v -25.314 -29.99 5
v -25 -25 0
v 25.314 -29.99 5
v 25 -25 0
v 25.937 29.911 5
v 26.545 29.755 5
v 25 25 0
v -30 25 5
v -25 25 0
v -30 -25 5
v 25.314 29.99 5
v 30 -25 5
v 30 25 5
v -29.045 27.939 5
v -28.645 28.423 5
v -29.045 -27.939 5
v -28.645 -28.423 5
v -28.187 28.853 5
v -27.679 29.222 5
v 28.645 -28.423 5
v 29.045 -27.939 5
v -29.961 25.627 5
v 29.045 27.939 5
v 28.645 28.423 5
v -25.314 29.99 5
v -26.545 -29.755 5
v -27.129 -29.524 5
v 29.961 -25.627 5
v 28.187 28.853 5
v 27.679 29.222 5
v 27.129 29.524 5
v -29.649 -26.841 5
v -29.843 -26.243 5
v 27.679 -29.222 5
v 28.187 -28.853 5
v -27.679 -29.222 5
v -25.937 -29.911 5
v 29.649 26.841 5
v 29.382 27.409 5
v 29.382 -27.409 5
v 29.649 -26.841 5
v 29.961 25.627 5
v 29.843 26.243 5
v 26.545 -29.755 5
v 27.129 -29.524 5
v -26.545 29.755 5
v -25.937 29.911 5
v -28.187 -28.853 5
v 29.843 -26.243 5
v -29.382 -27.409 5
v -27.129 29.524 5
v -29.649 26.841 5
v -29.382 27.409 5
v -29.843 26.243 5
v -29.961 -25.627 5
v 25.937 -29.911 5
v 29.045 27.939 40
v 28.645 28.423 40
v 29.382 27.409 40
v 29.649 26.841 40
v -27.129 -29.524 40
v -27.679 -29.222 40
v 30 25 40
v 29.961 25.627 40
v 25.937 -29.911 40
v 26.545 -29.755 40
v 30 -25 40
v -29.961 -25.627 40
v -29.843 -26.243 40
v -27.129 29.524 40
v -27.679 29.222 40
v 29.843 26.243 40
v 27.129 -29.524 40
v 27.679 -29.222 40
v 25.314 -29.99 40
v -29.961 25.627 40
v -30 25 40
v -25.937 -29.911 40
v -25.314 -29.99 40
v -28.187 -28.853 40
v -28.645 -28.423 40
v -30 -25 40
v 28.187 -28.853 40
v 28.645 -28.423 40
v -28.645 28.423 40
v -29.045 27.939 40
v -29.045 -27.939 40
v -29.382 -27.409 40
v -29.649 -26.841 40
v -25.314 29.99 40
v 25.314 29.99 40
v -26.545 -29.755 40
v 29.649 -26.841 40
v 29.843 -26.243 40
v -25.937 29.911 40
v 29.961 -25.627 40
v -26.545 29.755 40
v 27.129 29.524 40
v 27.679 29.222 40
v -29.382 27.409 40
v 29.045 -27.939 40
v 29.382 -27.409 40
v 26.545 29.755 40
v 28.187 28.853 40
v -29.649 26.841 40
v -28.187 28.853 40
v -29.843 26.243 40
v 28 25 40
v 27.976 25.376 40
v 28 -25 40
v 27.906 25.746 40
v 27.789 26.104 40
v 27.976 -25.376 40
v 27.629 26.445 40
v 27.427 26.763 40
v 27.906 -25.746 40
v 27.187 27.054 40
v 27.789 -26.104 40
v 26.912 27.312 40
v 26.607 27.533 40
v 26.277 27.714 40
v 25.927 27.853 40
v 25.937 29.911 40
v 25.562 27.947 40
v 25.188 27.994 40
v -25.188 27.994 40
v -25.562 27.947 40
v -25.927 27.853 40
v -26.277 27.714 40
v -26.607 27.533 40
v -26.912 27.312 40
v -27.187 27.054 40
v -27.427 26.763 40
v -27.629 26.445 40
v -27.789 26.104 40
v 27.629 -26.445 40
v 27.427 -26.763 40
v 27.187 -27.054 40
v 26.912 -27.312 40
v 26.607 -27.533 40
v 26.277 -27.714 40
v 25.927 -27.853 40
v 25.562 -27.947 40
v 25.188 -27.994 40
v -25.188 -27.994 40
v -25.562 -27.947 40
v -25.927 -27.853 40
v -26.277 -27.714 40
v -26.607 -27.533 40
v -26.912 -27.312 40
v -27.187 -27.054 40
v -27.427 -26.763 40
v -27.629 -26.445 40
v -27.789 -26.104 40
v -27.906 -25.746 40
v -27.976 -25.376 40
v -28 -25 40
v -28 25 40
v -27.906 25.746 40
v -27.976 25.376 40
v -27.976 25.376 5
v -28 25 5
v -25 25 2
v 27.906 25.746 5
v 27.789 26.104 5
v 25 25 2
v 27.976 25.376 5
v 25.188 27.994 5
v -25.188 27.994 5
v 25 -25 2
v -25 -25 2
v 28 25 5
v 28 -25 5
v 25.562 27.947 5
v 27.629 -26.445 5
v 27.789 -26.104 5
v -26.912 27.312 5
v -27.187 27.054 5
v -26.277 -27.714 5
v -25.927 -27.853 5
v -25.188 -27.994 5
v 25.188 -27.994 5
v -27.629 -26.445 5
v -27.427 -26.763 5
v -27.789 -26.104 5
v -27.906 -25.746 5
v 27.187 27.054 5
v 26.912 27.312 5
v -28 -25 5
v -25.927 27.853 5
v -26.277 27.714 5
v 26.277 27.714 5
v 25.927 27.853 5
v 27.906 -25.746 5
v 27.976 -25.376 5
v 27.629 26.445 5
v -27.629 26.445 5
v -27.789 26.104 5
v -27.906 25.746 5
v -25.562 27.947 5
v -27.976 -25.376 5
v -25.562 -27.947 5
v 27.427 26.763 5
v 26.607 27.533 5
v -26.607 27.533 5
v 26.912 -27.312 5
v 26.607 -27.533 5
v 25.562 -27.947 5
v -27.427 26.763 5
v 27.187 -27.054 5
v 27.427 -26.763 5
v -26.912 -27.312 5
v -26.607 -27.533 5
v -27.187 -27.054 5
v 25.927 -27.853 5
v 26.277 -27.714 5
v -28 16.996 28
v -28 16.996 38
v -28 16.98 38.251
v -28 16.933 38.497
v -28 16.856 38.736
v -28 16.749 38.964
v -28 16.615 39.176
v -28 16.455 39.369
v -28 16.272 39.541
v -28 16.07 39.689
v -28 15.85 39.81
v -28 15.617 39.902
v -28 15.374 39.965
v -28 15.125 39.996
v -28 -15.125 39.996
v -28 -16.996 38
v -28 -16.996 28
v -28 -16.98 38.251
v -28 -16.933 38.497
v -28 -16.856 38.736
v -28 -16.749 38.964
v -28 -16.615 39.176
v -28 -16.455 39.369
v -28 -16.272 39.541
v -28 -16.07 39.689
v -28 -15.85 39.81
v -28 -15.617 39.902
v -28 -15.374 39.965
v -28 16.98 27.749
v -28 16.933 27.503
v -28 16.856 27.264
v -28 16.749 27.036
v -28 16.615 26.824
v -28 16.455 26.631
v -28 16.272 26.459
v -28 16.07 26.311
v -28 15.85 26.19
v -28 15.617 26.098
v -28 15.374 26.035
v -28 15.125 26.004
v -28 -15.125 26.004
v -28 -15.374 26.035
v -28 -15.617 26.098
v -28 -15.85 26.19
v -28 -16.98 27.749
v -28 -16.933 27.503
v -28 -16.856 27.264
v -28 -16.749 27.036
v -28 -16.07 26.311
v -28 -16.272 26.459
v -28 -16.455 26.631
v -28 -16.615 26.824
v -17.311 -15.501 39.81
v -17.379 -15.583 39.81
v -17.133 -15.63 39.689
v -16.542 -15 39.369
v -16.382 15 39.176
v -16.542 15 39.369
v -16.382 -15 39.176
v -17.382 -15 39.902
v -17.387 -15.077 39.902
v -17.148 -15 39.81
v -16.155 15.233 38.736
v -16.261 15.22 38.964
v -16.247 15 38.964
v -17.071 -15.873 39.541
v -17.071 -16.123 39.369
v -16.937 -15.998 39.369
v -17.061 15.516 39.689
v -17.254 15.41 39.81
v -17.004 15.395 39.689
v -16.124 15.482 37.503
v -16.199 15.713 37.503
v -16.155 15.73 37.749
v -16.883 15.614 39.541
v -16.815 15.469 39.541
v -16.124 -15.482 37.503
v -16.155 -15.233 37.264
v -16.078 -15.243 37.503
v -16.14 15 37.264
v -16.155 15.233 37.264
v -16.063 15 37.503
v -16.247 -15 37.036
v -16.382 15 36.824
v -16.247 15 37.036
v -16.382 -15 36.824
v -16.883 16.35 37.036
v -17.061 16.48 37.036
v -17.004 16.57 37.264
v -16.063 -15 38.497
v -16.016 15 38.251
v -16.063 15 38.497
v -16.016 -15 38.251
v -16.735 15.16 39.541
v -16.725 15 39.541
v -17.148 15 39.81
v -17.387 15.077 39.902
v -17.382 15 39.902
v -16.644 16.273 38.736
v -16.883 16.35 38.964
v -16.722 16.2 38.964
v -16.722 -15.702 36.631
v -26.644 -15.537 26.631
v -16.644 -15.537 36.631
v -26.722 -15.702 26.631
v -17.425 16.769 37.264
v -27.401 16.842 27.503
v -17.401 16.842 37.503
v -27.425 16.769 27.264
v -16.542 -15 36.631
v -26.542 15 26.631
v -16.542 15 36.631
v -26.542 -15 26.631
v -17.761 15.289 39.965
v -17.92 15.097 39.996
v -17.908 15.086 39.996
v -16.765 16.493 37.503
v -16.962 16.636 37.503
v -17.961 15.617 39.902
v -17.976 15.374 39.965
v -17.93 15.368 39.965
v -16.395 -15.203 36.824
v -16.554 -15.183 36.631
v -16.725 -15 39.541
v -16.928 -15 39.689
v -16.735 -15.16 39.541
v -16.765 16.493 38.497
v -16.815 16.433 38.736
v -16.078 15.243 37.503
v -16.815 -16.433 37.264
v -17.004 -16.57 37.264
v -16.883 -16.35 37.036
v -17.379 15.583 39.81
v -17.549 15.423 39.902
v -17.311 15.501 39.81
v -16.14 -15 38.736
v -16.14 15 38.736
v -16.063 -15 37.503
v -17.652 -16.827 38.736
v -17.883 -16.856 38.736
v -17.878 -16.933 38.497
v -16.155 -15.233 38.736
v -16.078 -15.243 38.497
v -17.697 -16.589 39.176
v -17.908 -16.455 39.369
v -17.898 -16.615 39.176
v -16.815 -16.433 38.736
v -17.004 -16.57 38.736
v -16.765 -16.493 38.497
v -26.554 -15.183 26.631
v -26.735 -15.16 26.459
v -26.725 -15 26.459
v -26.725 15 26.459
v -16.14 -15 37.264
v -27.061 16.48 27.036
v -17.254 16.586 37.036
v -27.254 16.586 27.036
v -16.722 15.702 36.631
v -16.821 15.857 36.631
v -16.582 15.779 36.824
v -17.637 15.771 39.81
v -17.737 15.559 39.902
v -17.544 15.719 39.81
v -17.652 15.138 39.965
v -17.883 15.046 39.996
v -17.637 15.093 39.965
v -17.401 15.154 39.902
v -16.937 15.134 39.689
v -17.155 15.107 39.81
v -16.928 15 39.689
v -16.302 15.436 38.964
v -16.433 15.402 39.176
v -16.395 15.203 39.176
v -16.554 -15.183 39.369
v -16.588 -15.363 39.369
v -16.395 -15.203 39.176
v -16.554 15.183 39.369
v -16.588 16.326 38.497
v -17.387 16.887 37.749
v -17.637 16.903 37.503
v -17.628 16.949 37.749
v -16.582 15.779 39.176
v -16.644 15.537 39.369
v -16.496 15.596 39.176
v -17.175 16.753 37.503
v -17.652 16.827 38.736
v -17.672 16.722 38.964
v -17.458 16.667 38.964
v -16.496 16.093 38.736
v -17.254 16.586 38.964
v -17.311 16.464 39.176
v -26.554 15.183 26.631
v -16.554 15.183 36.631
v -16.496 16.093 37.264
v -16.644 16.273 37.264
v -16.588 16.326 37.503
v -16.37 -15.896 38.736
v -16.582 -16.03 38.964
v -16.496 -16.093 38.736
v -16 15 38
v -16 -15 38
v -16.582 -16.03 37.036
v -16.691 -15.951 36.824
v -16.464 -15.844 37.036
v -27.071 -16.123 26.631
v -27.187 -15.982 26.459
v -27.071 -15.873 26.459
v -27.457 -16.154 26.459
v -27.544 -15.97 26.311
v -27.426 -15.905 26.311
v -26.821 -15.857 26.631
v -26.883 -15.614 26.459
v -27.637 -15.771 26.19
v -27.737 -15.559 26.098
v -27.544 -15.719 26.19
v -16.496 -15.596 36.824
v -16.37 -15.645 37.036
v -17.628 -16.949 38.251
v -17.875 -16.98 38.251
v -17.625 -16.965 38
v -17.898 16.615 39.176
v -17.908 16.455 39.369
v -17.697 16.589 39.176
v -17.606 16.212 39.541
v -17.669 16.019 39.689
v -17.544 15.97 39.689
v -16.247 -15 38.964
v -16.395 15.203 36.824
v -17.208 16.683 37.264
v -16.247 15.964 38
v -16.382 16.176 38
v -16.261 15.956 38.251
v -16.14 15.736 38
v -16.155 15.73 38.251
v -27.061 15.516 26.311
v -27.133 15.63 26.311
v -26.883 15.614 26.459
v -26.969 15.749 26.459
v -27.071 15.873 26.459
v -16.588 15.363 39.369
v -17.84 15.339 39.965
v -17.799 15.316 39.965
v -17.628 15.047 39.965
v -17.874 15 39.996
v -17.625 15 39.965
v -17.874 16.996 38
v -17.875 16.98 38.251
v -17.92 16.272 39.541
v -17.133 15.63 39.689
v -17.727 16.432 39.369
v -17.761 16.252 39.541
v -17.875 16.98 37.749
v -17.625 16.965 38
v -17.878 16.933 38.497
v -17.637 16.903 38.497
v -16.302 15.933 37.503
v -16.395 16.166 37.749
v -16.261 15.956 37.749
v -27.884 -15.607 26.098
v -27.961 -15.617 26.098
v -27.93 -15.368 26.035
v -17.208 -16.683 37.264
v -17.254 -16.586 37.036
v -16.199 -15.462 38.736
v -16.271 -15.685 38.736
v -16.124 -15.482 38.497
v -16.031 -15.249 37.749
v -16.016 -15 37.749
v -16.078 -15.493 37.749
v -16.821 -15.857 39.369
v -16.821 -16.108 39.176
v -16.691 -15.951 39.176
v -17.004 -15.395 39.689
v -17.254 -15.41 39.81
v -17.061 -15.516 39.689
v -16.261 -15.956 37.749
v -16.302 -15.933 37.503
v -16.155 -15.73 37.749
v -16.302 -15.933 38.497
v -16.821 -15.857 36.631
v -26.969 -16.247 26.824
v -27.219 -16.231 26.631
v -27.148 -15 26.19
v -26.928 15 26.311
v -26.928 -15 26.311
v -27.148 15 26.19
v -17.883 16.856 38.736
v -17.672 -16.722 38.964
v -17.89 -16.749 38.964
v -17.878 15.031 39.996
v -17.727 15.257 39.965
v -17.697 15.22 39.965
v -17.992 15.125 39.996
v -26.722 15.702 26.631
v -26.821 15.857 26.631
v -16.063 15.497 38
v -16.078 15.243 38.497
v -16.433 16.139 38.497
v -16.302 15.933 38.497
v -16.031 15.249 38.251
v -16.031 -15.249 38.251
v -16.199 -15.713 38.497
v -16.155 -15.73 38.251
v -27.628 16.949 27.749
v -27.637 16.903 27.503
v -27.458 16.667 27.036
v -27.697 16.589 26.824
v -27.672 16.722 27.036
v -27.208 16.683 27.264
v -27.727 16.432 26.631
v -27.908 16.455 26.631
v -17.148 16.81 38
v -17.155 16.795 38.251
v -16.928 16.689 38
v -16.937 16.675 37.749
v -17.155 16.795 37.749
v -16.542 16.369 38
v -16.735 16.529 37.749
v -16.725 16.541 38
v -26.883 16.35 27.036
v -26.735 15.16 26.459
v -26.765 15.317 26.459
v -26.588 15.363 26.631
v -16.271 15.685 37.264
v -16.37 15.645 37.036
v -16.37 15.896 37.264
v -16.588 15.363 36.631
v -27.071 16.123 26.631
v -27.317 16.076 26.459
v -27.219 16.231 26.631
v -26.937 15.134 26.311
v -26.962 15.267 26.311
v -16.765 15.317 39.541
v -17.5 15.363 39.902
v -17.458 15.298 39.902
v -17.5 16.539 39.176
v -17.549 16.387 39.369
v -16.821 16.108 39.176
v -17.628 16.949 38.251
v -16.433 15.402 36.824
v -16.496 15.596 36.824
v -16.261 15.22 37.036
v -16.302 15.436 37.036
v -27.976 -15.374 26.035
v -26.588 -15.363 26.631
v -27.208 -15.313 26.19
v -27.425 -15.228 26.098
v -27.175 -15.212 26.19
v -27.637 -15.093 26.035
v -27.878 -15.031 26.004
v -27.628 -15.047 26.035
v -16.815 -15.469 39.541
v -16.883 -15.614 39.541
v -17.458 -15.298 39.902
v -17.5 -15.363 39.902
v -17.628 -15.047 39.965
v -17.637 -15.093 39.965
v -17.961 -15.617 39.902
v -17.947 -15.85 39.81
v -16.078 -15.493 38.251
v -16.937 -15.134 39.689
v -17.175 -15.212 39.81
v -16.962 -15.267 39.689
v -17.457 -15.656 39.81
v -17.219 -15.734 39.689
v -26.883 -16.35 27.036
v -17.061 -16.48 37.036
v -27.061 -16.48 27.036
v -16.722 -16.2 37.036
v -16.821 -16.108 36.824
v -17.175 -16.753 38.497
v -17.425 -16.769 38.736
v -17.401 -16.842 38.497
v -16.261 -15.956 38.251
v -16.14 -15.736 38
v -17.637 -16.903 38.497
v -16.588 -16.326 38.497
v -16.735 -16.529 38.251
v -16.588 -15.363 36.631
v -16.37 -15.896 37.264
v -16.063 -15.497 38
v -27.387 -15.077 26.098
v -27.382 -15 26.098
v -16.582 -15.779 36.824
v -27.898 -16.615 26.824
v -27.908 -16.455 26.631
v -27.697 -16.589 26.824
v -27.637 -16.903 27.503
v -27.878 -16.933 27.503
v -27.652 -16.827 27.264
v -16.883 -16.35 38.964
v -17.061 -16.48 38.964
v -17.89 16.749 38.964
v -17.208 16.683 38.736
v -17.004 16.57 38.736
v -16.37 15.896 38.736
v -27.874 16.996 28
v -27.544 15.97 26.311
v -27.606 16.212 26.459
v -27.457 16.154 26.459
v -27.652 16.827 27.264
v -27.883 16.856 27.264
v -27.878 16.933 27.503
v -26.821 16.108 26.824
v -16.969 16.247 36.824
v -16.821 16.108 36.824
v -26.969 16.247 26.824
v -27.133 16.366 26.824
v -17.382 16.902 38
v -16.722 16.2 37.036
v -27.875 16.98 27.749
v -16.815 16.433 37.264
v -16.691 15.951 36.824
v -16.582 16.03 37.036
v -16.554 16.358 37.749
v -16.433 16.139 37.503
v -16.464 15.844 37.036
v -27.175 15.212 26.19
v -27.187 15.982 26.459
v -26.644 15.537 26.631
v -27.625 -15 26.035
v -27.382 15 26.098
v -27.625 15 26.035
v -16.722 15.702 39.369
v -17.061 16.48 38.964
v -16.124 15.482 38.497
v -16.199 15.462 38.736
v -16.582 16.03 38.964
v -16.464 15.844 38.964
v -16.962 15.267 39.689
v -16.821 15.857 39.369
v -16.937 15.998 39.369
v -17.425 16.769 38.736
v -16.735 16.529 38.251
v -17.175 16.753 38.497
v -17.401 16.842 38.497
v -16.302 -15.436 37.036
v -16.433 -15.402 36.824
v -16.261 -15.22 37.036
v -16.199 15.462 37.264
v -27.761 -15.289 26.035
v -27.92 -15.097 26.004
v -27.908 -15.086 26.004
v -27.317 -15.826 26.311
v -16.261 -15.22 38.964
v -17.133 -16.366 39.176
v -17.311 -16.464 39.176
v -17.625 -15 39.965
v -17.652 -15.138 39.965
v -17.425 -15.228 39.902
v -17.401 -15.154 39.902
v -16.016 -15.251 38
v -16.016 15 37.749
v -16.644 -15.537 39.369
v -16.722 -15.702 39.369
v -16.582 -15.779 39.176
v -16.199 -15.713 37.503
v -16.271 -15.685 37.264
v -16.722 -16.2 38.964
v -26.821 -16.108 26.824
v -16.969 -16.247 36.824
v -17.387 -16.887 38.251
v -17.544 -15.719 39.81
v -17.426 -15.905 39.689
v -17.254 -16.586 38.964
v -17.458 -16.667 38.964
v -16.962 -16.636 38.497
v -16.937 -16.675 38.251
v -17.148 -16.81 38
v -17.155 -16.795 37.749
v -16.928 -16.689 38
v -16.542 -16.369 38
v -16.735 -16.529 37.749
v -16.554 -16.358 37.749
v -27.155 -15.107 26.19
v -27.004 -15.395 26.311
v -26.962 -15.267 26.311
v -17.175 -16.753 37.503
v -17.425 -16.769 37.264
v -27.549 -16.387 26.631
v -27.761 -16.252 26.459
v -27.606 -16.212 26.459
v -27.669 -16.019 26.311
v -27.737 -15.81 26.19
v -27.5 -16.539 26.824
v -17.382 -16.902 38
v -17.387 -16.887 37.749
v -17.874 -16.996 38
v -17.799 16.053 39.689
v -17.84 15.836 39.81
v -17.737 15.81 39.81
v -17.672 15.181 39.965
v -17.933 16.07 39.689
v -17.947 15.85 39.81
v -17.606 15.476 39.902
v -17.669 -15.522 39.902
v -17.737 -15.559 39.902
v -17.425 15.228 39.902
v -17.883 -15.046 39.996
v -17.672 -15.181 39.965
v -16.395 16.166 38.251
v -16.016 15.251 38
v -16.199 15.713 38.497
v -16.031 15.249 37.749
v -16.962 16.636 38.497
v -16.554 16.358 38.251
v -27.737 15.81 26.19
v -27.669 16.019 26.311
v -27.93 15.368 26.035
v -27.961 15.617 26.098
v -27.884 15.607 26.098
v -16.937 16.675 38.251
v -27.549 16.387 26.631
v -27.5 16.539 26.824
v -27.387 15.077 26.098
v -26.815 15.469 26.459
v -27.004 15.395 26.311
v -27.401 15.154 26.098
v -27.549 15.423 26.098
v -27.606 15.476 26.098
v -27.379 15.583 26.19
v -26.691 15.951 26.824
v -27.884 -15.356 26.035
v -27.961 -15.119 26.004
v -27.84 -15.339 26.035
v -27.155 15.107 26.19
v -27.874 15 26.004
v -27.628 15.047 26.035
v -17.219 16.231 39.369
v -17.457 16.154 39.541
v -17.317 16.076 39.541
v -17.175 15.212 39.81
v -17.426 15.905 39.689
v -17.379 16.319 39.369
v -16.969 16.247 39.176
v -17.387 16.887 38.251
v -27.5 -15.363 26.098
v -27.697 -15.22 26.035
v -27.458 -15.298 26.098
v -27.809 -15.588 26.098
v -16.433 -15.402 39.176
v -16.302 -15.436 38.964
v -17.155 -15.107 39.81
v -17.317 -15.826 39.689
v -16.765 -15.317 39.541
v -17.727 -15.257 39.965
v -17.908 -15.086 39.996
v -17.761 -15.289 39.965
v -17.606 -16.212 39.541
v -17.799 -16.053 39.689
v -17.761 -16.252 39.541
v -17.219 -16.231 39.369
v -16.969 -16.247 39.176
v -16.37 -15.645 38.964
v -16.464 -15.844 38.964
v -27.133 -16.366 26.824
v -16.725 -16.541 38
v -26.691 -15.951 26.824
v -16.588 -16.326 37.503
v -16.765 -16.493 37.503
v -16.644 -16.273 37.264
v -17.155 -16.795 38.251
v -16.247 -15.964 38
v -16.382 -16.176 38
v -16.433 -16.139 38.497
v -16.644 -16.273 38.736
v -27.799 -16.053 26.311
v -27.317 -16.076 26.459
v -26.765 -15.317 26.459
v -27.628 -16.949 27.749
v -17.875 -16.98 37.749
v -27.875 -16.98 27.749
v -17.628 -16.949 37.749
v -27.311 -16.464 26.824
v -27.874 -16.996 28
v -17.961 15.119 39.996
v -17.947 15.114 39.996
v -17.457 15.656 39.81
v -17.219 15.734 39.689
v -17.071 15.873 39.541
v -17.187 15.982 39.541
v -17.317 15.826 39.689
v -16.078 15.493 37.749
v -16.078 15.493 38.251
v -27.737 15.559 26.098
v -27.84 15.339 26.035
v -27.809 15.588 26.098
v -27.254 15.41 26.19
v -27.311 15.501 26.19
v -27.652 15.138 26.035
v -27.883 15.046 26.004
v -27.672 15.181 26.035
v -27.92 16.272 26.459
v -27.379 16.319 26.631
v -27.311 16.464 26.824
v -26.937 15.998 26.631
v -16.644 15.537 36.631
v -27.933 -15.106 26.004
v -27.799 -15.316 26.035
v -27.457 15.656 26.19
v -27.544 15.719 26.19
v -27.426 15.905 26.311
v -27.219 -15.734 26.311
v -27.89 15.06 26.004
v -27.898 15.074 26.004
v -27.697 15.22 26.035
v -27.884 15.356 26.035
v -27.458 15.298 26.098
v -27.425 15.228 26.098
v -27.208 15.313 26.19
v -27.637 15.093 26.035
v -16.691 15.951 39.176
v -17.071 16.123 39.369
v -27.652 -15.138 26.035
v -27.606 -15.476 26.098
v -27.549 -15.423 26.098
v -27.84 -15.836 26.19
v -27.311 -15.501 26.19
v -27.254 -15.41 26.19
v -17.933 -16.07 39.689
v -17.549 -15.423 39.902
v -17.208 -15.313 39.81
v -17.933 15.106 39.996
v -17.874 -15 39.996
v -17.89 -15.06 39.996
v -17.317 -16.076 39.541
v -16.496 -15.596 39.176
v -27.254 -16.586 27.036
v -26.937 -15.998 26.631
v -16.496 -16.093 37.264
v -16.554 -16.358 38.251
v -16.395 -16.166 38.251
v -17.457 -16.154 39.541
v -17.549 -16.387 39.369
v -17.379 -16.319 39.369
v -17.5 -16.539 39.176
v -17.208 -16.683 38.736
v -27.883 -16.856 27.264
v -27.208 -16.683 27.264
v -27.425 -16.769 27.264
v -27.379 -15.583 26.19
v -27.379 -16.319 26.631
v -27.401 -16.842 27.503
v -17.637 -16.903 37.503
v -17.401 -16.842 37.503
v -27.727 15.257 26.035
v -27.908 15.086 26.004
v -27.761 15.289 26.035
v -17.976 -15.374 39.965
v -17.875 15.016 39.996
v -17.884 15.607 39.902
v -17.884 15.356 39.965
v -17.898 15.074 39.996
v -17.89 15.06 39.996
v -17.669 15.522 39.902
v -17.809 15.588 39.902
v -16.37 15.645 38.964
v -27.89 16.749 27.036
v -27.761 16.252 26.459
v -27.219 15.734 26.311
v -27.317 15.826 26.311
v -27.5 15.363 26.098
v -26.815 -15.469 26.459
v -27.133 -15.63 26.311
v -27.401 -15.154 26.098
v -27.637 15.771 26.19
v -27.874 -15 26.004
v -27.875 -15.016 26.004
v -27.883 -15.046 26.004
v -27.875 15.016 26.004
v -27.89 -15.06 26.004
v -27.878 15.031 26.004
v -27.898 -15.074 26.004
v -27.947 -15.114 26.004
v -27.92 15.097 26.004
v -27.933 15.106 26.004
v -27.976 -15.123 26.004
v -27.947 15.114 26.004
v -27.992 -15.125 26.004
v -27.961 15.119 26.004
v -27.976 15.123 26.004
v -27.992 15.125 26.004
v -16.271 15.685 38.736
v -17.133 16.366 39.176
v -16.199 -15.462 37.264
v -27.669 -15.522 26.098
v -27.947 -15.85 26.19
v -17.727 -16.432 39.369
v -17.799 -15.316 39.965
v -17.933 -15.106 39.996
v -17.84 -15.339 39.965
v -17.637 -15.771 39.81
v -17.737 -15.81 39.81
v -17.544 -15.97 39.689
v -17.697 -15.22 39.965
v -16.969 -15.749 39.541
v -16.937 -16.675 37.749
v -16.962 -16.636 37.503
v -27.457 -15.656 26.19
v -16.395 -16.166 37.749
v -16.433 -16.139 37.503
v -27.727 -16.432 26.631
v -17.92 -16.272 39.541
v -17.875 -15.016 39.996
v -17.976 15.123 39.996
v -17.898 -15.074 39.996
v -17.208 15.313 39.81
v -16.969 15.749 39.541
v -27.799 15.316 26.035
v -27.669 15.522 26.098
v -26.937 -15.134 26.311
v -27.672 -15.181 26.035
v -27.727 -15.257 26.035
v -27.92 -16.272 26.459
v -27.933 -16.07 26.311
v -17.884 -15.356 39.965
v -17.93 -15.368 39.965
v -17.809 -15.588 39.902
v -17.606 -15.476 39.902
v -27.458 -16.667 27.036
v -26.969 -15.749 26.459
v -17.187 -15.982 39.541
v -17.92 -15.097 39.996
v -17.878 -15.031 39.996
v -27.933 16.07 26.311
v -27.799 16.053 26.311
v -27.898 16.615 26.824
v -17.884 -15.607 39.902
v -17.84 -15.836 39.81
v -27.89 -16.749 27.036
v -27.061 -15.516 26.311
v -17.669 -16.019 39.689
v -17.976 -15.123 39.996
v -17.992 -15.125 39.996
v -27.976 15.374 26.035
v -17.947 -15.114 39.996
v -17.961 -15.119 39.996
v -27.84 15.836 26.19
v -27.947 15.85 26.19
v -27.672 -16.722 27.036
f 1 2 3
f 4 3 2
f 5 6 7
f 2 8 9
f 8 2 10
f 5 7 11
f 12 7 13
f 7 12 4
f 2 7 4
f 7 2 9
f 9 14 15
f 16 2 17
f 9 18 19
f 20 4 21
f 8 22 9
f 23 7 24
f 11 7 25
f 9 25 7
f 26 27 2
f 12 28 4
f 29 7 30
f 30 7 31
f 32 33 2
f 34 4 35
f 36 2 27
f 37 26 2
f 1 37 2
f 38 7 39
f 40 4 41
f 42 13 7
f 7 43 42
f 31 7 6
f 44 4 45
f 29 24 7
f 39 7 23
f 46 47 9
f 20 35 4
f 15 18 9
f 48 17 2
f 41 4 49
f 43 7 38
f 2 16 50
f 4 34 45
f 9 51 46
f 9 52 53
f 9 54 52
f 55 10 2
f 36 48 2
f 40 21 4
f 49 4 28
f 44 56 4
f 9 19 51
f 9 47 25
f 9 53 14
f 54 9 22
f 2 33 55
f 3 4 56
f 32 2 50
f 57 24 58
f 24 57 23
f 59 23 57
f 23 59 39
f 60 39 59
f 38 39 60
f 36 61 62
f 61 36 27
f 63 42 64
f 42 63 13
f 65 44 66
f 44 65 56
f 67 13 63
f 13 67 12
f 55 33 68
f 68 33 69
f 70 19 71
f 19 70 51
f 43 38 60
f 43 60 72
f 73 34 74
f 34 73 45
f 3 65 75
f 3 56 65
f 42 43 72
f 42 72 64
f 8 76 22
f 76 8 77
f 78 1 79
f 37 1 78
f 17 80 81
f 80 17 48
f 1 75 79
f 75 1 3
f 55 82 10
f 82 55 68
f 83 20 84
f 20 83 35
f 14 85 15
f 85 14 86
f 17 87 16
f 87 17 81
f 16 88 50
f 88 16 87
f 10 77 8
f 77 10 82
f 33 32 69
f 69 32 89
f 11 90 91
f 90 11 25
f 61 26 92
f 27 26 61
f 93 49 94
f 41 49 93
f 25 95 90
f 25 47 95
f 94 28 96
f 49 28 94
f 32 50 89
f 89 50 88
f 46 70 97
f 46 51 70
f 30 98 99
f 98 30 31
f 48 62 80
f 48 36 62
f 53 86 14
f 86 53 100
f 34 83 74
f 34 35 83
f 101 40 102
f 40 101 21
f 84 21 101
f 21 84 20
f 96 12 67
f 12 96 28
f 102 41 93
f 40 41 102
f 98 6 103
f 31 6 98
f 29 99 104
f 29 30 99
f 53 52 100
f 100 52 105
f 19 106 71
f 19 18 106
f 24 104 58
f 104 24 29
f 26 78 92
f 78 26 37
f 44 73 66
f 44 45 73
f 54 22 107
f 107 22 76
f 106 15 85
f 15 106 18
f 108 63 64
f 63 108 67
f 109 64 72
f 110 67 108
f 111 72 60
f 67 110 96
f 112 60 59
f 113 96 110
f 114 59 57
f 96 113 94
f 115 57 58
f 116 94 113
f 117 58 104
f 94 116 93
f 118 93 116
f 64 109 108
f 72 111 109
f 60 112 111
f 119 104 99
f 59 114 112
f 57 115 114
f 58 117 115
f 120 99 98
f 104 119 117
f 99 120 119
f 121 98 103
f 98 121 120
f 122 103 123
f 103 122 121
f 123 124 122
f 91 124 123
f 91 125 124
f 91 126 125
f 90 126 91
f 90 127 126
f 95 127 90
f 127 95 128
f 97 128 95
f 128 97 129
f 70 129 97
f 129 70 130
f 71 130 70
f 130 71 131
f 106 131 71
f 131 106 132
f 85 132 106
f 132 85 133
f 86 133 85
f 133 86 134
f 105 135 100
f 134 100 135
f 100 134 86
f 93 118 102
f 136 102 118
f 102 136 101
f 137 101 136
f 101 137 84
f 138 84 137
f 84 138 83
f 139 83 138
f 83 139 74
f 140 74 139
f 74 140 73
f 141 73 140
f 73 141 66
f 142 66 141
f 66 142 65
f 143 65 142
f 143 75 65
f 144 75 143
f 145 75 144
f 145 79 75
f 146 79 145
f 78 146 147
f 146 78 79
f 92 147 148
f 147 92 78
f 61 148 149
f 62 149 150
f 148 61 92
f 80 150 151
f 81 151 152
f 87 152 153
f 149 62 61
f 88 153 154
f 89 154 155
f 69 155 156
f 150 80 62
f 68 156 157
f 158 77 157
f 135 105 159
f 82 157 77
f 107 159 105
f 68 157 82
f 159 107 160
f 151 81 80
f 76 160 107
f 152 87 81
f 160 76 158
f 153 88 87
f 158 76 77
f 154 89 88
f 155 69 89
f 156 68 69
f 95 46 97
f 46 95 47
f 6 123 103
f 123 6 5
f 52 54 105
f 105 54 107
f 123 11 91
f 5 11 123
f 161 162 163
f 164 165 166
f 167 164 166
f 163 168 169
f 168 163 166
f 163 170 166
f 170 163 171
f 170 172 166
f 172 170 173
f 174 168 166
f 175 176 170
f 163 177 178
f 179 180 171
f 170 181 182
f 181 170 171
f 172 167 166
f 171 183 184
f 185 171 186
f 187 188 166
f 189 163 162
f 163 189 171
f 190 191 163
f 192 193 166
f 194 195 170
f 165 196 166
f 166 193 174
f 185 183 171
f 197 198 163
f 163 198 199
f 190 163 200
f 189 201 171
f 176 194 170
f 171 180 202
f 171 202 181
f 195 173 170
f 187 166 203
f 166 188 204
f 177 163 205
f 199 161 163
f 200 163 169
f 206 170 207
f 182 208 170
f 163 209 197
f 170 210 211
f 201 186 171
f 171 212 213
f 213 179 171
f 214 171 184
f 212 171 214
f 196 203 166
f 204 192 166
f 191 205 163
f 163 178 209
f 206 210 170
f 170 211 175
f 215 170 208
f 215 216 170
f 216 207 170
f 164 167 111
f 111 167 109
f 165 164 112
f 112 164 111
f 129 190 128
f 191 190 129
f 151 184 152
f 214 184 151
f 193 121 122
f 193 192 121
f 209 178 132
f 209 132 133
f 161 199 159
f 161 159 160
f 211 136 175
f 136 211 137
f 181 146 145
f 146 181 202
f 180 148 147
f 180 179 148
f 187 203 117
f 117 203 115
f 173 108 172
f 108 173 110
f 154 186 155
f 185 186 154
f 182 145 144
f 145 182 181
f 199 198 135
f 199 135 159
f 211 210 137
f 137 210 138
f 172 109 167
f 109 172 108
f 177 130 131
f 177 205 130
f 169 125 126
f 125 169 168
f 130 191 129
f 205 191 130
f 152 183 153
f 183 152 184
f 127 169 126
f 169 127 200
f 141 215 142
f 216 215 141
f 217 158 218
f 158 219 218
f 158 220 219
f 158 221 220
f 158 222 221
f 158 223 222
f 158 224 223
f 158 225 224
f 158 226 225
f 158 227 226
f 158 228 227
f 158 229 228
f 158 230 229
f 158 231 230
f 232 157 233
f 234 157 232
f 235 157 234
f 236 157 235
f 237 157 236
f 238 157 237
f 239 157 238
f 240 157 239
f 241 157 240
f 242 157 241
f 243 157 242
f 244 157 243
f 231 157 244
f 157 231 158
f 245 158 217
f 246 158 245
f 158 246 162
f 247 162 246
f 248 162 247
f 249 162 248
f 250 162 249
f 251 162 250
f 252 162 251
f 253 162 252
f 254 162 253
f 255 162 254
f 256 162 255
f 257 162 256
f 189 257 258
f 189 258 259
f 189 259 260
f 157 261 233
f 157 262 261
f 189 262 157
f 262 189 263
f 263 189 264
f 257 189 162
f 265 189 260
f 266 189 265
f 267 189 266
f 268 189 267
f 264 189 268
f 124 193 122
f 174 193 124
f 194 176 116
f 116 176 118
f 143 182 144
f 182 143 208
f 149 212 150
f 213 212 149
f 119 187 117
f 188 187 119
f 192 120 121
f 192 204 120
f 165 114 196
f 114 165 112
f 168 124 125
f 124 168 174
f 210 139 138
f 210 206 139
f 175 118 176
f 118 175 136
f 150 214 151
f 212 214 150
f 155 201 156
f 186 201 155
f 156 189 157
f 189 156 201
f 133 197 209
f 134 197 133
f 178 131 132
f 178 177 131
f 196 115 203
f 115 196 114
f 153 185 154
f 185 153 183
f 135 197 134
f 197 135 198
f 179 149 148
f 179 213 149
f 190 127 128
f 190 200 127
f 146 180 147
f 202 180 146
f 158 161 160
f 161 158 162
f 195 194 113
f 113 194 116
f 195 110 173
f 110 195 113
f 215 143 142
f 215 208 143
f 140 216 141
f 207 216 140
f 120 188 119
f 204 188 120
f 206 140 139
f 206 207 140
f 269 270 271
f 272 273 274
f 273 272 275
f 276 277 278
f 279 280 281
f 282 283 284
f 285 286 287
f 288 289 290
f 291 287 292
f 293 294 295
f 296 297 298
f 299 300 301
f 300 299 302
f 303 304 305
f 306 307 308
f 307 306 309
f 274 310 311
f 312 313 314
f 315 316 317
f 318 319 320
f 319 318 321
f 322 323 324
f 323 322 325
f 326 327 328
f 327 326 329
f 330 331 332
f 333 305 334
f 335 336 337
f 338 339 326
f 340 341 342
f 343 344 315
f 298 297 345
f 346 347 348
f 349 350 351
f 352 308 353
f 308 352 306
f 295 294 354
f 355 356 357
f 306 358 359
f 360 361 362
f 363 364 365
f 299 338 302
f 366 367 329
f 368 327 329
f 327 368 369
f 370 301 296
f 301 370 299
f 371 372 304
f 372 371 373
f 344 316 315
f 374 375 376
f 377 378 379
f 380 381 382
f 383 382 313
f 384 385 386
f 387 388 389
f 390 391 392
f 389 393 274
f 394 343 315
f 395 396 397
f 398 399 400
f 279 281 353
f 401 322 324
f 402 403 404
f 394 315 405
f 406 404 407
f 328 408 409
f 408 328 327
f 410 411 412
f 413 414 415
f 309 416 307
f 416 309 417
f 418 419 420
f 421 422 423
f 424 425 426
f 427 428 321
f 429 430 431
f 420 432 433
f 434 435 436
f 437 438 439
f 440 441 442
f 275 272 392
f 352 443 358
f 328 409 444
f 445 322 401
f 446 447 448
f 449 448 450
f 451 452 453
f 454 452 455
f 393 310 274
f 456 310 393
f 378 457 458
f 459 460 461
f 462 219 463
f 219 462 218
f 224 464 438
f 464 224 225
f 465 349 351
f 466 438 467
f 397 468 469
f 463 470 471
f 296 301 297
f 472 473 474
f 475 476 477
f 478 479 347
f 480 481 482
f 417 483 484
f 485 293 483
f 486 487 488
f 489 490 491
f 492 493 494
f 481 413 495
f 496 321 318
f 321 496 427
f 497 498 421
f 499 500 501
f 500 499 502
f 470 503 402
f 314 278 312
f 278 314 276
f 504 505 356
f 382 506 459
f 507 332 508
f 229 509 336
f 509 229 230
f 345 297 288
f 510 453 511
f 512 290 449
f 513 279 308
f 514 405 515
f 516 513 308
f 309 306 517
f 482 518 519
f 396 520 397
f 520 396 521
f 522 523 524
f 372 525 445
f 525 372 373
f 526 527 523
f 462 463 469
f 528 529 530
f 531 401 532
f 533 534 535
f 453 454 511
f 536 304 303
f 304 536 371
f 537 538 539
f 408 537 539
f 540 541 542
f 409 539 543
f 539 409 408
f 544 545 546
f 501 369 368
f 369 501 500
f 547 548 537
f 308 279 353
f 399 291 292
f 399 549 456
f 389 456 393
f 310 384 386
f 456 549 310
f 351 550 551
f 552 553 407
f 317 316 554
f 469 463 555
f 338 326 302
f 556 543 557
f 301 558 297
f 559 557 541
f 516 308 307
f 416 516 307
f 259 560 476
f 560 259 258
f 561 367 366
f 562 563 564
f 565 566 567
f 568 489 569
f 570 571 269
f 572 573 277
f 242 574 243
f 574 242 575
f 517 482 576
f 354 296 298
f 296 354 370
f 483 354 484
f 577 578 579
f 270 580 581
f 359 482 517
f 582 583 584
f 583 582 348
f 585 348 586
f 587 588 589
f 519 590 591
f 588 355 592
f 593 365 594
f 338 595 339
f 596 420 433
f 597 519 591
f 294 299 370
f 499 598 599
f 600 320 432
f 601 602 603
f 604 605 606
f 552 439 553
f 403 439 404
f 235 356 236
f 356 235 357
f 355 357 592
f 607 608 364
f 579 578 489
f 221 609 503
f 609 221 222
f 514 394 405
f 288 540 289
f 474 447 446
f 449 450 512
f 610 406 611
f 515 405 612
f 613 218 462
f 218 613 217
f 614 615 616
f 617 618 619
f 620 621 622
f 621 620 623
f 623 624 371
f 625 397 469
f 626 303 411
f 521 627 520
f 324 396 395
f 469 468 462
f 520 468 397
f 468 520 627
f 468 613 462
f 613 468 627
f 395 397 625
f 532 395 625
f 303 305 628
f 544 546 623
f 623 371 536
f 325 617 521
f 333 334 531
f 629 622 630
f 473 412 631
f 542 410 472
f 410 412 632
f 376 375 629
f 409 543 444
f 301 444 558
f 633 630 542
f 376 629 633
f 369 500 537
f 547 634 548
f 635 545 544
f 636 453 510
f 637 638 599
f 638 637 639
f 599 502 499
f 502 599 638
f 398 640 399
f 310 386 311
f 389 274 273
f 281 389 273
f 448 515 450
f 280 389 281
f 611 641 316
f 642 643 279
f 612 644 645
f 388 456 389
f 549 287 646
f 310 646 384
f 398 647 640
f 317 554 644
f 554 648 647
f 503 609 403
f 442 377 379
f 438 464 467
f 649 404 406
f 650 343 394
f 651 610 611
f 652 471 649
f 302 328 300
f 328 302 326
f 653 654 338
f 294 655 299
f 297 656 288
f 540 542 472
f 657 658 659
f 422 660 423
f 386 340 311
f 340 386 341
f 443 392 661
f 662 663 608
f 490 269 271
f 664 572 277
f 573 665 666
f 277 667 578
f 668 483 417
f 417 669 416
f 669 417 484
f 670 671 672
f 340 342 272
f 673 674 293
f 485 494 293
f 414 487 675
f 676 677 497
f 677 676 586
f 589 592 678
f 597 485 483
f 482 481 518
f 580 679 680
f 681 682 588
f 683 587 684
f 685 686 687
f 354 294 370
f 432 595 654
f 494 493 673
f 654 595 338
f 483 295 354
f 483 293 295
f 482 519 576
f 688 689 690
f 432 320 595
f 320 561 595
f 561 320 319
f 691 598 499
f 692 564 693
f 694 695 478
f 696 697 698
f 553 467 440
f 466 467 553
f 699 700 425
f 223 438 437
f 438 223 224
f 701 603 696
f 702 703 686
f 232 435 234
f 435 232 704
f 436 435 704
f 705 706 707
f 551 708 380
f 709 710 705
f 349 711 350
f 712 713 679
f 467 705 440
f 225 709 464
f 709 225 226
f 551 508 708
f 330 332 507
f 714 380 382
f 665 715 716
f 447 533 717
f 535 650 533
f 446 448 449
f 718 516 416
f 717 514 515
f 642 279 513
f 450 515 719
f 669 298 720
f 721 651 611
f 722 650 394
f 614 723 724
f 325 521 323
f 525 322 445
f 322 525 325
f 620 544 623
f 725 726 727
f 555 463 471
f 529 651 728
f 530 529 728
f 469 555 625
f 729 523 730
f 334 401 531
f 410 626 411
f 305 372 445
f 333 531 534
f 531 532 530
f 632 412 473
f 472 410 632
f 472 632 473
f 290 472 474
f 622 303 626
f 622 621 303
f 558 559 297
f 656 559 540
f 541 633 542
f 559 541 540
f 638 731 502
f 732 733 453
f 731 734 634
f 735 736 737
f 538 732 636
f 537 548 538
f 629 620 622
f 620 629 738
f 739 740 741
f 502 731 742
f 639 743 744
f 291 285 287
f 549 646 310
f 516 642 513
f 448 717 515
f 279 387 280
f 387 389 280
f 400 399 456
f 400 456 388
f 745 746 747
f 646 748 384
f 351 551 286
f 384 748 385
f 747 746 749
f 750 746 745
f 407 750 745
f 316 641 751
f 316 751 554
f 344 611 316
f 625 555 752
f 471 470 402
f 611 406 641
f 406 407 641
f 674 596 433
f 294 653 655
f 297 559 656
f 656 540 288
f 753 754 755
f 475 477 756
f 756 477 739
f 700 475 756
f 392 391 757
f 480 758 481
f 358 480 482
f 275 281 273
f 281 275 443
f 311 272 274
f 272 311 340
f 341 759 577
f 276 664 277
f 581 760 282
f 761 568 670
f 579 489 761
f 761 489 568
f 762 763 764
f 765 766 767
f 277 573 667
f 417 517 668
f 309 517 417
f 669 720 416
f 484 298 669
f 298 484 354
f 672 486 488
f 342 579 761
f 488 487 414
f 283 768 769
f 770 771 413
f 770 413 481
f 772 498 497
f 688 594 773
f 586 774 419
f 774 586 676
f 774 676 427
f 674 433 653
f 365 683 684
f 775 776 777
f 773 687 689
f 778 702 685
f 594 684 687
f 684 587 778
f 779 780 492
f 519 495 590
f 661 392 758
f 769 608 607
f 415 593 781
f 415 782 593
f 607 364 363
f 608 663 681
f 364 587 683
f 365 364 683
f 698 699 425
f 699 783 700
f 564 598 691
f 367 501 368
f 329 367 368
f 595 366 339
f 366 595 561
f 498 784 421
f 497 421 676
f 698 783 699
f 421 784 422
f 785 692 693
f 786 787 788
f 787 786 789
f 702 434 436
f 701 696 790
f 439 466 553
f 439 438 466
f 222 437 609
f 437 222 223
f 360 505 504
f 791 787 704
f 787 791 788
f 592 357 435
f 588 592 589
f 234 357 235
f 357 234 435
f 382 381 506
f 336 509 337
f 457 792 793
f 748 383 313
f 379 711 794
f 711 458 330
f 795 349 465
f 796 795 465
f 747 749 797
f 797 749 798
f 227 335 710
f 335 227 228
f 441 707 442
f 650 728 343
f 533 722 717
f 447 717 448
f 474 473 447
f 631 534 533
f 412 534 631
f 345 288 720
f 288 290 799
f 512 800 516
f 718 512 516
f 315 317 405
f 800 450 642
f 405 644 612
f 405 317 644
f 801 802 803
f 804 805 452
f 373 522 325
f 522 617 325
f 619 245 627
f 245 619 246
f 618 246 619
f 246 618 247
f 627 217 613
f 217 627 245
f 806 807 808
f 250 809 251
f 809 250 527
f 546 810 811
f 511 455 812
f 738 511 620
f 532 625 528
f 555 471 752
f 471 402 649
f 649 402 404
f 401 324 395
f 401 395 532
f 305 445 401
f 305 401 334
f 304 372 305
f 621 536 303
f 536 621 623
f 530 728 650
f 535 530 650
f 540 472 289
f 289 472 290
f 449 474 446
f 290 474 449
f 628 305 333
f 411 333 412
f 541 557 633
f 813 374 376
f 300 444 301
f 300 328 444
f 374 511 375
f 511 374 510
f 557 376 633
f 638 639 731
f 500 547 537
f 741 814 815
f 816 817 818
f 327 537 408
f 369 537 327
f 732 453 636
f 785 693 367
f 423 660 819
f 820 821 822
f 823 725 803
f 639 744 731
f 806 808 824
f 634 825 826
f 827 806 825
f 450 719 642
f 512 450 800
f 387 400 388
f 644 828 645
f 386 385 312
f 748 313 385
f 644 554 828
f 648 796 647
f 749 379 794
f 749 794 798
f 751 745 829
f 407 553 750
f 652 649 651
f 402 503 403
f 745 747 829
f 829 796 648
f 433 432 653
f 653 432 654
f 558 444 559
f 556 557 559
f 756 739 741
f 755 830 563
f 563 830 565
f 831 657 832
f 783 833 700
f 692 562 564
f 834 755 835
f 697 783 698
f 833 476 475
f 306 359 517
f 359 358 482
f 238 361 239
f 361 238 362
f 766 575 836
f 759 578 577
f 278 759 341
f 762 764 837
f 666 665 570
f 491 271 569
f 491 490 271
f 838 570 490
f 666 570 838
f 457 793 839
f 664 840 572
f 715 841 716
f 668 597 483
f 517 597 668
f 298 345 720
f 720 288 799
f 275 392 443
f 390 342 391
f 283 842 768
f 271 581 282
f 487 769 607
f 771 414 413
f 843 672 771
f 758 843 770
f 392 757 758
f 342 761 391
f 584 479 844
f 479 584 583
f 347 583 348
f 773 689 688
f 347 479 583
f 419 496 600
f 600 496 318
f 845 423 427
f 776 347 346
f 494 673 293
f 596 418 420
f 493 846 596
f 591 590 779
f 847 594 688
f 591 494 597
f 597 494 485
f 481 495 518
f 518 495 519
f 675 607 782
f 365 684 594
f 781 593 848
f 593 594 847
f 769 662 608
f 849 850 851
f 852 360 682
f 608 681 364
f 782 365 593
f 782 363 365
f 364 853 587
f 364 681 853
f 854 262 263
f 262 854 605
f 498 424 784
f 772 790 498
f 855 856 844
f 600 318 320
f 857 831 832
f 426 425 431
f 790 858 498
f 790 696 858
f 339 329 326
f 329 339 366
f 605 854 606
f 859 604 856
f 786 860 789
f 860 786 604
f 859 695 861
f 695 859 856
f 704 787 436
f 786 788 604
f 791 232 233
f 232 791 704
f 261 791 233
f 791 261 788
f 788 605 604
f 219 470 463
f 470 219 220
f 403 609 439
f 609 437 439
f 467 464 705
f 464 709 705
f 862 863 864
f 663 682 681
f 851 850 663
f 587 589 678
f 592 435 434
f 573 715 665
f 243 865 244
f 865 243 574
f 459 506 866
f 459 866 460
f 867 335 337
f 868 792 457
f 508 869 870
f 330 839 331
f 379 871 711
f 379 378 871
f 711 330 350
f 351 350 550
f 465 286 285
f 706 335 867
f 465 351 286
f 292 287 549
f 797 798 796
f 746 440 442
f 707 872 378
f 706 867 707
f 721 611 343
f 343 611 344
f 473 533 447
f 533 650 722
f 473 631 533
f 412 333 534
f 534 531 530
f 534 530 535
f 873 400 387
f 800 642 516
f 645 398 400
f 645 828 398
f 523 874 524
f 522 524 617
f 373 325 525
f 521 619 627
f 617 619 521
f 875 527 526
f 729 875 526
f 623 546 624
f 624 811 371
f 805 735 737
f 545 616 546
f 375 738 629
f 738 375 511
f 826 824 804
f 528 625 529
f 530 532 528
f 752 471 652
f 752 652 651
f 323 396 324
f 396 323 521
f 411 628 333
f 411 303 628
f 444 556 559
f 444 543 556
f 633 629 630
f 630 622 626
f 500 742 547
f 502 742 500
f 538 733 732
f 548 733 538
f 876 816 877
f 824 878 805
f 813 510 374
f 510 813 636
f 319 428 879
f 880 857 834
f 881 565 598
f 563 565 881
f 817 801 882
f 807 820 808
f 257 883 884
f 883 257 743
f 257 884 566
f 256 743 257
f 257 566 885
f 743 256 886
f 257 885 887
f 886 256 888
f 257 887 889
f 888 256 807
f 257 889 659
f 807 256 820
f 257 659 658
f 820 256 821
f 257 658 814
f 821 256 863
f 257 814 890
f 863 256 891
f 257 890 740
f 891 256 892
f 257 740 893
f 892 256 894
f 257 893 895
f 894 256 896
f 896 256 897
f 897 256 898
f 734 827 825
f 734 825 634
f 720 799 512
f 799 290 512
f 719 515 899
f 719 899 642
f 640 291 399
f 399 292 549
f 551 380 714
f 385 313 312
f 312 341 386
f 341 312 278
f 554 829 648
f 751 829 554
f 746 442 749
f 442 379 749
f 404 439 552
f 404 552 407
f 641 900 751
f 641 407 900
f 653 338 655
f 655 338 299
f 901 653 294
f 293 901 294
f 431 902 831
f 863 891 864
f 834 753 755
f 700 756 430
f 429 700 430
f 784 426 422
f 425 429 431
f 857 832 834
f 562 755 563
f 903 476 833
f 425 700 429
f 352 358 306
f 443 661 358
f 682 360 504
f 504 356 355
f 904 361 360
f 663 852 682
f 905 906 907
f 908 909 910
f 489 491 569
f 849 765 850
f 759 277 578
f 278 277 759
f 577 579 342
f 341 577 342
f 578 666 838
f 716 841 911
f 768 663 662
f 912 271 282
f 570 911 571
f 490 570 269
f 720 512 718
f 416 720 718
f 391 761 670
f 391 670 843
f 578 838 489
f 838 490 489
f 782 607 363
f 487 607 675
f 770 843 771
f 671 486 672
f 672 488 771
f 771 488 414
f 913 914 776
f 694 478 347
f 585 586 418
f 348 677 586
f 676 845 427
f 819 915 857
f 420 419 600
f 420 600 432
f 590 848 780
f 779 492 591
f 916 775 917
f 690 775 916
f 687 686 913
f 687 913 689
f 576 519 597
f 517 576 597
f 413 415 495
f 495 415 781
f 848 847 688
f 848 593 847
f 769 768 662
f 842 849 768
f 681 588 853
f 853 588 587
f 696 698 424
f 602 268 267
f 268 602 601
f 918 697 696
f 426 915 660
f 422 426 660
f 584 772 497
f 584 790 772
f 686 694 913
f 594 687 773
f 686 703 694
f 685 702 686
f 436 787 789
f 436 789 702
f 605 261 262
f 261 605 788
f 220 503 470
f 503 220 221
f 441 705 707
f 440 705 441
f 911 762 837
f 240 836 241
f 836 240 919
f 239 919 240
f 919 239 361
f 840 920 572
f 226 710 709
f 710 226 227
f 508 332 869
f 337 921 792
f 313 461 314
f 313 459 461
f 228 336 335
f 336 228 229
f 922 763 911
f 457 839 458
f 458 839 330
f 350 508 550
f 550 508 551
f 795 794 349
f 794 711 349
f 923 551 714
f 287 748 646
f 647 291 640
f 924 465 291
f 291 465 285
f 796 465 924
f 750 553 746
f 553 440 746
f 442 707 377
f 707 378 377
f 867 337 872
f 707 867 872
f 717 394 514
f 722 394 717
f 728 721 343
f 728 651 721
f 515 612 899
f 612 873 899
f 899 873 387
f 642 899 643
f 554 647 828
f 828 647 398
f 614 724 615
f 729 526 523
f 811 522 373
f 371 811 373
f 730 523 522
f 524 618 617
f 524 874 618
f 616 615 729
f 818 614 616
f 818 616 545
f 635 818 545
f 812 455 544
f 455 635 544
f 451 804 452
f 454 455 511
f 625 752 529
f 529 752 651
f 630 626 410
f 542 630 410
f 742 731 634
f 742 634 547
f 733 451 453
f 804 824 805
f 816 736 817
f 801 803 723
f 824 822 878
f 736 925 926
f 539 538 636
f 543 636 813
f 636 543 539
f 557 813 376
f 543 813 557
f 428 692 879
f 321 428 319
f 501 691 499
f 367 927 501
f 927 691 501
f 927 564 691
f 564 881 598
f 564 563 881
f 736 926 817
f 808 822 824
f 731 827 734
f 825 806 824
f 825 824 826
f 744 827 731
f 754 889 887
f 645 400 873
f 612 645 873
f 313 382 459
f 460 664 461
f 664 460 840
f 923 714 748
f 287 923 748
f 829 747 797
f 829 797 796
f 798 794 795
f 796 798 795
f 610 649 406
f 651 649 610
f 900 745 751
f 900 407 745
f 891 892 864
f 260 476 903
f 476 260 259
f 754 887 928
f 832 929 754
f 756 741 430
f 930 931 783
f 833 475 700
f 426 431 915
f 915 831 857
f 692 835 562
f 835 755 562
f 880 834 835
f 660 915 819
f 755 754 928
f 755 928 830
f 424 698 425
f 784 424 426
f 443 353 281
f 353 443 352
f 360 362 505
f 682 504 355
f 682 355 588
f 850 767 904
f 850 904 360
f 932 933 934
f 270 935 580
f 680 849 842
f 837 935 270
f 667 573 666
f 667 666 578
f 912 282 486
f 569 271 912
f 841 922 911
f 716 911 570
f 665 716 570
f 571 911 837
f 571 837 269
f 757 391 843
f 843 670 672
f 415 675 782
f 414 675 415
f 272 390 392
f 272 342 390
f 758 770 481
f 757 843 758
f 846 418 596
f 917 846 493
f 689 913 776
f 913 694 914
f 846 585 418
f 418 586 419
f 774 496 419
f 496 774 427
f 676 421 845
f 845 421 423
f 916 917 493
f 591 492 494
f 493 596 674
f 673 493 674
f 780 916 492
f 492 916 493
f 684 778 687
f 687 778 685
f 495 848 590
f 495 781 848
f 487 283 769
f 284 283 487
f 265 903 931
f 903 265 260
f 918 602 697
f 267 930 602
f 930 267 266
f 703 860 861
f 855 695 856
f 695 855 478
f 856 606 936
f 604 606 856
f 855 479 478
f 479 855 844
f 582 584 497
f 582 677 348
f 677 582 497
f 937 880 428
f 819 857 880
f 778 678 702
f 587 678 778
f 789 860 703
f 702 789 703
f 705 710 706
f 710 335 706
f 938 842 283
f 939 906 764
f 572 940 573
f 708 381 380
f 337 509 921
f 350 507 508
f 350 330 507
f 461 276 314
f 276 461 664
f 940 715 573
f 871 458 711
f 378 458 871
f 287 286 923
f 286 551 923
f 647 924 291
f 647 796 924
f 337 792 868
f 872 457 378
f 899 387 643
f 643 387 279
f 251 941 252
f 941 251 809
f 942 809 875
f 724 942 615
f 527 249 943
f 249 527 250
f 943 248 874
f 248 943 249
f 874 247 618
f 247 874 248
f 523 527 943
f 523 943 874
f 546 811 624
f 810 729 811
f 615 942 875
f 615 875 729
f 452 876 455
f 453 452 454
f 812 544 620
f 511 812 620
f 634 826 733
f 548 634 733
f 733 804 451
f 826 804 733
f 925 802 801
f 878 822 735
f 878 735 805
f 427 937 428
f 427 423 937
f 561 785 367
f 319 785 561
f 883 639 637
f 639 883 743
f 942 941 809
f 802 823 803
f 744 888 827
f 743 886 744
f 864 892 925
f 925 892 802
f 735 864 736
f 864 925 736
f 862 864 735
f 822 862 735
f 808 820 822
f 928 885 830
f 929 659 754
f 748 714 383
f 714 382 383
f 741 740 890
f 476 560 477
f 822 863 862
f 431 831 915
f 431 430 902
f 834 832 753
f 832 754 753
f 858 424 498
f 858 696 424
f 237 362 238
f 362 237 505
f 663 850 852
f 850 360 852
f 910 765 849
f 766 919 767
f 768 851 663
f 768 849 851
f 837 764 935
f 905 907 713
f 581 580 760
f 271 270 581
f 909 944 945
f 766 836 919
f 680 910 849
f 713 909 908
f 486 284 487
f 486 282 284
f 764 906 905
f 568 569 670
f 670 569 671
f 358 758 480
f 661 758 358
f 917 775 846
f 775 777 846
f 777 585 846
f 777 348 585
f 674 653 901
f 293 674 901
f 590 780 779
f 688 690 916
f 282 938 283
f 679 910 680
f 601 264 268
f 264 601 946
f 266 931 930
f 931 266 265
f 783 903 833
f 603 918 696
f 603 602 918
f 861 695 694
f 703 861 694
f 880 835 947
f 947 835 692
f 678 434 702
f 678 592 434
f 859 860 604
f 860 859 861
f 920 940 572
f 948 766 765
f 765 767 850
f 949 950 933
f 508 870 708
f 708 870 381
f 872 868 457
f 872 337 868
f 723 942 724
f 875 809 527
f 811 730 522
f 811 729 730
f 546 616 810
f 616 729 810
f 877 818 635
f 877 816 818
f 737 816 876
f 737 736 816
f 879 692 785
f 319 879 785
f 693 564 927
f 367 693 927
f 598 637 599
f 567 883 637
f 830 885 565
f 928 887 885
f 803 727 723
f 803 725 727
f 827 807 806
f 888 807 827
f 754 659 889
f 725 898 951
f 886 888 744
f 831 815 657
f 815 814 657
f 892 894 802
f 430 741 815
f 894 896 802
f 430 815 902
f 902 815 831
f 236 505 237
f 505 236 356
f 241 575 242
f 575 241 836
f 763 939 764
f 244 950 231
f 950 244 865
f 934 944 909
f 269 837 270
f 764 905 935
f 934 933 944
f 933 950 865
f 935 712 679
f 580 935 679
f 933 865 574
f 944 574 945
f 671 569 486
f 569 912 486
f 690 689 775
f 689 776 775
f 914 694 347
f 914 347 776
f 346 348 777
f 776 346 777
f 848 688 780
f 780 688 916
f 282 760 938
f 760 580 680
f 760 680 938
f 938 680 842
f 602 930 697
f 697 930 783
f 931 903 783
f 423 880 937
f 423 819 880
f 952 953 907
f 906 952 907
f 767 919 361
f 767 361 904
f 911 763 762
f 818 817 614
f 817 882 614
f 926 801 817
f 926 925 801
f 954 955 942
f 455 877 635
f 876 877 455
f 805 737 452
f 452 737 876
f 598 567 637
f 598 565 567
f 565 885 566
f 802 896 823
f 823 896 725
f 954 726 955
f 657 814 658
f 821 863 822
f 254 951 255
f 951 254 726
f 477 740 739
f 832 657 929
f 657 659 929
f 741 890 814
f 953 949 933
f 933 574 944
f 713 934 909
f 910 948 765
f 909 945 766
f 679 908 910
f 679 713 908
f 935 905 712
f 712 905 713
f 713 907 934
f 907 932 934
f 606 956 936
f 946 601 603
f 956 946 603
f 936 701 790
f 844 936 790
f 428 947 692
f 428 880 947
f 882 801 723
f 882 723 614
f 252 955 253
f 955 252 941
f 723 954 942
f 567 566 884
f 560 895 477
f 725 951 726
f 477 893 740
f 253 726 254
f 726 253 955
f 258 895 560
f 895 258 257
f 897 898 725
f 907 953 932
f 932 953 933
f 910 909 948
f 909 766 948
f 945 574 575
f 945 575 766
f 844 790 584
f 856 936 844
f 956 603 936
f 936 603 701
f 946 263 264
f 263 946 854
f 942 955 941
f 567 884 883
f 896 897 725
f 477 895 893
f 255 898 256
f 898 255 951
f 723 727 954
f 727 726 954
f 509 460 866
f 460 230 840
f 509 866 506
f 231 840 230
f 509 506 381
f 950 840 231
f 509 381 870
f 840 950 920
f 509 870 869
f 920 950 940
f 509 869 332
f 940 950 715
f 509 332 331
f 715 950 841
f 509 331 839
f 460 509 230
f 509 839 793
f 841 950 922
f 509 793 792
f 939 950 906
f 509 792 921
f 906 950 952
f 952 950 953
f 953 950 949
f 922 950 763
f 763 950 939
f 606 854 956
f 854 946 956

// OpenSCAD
$fn=50;

box_height=40;
box_size=60;
radius=5;
wall=2;
label_size=10;
label_length=30;

difference() {
    box(box_height, box_size, radius);
    
    translate([0, 0, wall]) {
        box(box_height, box_size-2*wall, radius-wall);
    }
}

translate([(-box_size)/2, 0, box_height]) label(label_length, label_size);

module label(length, size) {
    translate([wall, -length/2, -wall]) minkowski() {
        rotate([-90, 0, 0]) linear_extrude(height = length) polygon([[0,0], [size, 0], [0, size]]);
        sphere(wall);
    }
}

module box(height, size, radius) {
    difference() {
        linear_extrude(height=height) {
            minkowski() {
                square(size-2*radius, center=true);
                circle(radius);
            }
        }
        
        translate([-size/2, -size/2, 0]) difference() {
            translate([-0.5, -0.5, -1]) cube([size+1, size+1, radius+1]);
            translate([radius, radius, 0]) minkowski() {
                cube([size-2*radius, size-2*radius, radius]);
                cylinder(radius, 0, radius);
            }
        }
    }
}
